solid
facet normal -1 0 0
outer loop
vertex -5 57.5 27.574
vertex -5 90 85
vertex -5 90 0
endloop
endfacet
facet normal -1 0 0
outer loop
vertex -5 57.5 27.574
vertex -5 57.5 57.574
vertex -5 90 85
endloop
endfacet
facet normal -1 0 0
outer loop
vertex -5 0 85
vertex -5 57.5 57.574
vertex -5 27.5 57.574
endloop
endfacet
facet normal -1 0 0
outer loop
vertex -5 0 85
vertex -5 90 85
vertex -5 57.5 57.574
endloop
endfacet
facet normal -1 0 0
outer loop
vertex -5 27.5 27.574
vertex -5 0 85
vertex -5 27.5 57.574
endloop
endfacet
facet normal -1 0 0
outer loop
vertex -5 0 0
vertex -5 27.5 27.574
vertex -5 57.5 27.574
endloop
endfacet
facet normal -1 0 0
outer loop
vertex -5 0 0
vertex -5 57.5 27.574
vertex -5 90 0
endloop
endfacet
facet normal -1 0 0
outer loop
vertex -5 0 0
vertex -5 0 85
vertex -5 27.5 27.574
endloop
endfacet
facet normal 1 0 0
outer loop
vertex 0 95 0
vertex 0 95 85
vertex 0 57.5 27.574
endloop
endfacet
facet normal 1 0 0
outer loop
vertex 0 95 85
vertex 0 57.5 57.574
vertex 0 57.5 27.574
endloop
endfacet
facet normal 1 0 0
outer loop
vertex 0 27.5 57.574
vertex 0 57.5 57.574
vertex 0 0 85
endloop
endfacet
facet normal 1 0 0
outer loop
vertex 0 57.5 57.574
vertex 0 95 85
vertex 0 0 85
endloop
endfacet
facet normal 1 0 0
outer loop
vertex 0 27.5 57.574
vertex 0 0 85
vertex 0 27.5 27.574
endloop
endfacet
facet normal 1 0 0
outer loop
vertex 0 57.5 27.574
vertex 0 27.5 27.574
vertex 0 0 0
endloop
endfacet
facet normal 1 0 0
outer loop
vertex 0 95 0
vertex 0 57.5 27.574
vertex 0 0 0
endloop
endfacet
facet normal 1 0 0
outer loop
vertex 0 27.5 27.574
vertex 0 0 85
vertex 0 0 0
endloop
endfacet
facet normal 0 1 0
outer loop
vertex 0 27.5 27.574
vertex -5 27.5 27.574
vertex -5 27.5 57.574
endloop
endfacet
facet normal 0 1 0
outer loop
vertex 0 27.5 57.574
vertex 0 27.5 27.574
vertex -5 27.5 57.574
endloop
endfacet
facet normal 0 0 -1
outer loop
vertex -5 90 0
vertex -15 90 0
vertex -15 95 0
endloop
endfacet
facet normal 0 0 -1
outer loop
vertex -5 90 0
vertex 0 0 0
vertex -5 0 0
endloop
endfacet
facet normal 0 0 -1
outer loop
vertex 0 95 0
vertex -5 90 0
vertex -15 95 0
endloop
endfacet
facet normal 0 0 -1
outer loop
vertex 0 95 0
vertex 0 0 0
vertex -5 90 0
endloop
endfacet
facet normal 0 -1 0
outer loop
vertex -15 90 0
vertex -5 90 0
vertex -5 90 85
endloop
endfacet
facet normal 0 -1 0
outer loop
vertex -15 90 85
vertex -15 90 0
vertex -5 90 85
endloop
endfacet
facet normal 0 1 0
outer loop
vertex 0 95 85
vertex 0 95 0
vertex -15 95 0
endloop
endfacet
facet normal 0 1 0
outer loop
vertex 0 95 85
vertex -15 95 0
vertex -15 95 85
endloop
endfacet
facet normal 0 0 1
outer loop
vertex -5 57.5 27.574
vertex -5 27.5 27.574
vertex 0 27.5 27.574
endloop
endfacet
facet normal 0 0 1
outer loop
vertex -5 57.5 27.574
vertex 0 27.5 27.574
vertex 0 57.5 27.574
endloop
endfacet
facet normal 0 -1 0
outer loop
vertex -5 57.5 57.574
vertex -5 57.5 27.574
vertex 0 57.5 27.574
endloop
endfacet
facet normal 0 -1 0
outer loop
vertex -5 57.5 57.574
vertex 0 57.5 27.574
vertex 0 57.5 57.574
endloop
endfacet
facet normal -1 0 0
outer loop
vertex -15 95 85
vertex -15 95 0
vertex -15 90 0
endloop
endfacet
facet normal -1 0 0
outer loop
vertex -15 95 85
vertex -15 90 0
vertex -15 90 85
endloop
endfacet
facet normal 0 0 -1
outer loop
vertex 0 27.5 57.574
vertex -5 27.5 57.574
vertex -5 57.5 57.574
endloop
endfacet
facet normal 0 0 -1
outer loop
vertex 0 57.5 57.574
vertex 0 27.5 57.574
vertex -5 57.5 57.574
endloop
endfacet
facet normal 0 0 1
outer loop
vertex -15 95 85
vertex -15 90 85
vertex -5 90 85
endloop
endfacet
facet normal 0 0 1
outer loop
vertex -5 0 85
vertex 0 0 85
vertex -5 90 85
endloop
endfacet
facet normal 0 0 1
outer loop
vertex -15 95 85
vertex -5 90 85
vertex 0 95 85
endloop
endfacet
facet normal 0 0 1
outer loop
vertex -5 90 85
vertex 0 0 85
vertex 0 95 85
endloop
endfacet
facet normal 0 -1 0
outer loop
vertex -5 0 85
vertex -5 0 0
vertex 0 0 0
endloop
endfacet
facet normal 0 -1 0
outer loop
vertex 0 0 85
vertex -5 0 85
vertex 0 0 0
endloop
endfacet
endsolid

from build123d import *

# Parameters (mm, degrees)
SKETCH1_W           = 5
SKETCH1_H           = 85
BOSS_EXTRUDE1_DEPTH = 95
SKETCH2_W           = 85
SKETCH2_H           = 5
BOSS_EXTRUDE2_DEPTH = 10
SKETCH3_W           = 30
SKETCH3_H           = 30
CUT_EXTRUDE1_DEPTH  = 10


with BuildPart() as part:
    # Sketch1 → Boss-Extrude1 (new body)
    with BuildSketch(Plane(origin=(0, 0, 0), x_dir=(1, 0, 0), z_dir=(0, 1, 0))):
        with Locations((-2.5, -42.5)):
            Rectangle(SKETCH1_W, SKETCH1_H)
    extrude(amount=BOSS_EXTRUDE1_DEPTH)

    # Sketch2 → Boss-Extrude2 (add)
    with BuildSketch(Plane.ZY.offset(5)):
        with Locations((42.5, 92.5)):
            Rectangle(SKETCH2_W, SKETCH2_H)
    extrude(amount=BOSS_EXTRUDE2_DEPTH)

    # Sketch3 → Cut-Extrude1 (cut)
    with BuildSketch(Plane.ZY.offset(5)):
        with Locations((42.573593129, 42.5)):
            Rectangle(SKETCH3_W, SKETCH3_H)
    extrude(amount=-CUT_EXTRUDE1_DEPTH, mode=Mode.SUBTRACT)


solid = part.part
